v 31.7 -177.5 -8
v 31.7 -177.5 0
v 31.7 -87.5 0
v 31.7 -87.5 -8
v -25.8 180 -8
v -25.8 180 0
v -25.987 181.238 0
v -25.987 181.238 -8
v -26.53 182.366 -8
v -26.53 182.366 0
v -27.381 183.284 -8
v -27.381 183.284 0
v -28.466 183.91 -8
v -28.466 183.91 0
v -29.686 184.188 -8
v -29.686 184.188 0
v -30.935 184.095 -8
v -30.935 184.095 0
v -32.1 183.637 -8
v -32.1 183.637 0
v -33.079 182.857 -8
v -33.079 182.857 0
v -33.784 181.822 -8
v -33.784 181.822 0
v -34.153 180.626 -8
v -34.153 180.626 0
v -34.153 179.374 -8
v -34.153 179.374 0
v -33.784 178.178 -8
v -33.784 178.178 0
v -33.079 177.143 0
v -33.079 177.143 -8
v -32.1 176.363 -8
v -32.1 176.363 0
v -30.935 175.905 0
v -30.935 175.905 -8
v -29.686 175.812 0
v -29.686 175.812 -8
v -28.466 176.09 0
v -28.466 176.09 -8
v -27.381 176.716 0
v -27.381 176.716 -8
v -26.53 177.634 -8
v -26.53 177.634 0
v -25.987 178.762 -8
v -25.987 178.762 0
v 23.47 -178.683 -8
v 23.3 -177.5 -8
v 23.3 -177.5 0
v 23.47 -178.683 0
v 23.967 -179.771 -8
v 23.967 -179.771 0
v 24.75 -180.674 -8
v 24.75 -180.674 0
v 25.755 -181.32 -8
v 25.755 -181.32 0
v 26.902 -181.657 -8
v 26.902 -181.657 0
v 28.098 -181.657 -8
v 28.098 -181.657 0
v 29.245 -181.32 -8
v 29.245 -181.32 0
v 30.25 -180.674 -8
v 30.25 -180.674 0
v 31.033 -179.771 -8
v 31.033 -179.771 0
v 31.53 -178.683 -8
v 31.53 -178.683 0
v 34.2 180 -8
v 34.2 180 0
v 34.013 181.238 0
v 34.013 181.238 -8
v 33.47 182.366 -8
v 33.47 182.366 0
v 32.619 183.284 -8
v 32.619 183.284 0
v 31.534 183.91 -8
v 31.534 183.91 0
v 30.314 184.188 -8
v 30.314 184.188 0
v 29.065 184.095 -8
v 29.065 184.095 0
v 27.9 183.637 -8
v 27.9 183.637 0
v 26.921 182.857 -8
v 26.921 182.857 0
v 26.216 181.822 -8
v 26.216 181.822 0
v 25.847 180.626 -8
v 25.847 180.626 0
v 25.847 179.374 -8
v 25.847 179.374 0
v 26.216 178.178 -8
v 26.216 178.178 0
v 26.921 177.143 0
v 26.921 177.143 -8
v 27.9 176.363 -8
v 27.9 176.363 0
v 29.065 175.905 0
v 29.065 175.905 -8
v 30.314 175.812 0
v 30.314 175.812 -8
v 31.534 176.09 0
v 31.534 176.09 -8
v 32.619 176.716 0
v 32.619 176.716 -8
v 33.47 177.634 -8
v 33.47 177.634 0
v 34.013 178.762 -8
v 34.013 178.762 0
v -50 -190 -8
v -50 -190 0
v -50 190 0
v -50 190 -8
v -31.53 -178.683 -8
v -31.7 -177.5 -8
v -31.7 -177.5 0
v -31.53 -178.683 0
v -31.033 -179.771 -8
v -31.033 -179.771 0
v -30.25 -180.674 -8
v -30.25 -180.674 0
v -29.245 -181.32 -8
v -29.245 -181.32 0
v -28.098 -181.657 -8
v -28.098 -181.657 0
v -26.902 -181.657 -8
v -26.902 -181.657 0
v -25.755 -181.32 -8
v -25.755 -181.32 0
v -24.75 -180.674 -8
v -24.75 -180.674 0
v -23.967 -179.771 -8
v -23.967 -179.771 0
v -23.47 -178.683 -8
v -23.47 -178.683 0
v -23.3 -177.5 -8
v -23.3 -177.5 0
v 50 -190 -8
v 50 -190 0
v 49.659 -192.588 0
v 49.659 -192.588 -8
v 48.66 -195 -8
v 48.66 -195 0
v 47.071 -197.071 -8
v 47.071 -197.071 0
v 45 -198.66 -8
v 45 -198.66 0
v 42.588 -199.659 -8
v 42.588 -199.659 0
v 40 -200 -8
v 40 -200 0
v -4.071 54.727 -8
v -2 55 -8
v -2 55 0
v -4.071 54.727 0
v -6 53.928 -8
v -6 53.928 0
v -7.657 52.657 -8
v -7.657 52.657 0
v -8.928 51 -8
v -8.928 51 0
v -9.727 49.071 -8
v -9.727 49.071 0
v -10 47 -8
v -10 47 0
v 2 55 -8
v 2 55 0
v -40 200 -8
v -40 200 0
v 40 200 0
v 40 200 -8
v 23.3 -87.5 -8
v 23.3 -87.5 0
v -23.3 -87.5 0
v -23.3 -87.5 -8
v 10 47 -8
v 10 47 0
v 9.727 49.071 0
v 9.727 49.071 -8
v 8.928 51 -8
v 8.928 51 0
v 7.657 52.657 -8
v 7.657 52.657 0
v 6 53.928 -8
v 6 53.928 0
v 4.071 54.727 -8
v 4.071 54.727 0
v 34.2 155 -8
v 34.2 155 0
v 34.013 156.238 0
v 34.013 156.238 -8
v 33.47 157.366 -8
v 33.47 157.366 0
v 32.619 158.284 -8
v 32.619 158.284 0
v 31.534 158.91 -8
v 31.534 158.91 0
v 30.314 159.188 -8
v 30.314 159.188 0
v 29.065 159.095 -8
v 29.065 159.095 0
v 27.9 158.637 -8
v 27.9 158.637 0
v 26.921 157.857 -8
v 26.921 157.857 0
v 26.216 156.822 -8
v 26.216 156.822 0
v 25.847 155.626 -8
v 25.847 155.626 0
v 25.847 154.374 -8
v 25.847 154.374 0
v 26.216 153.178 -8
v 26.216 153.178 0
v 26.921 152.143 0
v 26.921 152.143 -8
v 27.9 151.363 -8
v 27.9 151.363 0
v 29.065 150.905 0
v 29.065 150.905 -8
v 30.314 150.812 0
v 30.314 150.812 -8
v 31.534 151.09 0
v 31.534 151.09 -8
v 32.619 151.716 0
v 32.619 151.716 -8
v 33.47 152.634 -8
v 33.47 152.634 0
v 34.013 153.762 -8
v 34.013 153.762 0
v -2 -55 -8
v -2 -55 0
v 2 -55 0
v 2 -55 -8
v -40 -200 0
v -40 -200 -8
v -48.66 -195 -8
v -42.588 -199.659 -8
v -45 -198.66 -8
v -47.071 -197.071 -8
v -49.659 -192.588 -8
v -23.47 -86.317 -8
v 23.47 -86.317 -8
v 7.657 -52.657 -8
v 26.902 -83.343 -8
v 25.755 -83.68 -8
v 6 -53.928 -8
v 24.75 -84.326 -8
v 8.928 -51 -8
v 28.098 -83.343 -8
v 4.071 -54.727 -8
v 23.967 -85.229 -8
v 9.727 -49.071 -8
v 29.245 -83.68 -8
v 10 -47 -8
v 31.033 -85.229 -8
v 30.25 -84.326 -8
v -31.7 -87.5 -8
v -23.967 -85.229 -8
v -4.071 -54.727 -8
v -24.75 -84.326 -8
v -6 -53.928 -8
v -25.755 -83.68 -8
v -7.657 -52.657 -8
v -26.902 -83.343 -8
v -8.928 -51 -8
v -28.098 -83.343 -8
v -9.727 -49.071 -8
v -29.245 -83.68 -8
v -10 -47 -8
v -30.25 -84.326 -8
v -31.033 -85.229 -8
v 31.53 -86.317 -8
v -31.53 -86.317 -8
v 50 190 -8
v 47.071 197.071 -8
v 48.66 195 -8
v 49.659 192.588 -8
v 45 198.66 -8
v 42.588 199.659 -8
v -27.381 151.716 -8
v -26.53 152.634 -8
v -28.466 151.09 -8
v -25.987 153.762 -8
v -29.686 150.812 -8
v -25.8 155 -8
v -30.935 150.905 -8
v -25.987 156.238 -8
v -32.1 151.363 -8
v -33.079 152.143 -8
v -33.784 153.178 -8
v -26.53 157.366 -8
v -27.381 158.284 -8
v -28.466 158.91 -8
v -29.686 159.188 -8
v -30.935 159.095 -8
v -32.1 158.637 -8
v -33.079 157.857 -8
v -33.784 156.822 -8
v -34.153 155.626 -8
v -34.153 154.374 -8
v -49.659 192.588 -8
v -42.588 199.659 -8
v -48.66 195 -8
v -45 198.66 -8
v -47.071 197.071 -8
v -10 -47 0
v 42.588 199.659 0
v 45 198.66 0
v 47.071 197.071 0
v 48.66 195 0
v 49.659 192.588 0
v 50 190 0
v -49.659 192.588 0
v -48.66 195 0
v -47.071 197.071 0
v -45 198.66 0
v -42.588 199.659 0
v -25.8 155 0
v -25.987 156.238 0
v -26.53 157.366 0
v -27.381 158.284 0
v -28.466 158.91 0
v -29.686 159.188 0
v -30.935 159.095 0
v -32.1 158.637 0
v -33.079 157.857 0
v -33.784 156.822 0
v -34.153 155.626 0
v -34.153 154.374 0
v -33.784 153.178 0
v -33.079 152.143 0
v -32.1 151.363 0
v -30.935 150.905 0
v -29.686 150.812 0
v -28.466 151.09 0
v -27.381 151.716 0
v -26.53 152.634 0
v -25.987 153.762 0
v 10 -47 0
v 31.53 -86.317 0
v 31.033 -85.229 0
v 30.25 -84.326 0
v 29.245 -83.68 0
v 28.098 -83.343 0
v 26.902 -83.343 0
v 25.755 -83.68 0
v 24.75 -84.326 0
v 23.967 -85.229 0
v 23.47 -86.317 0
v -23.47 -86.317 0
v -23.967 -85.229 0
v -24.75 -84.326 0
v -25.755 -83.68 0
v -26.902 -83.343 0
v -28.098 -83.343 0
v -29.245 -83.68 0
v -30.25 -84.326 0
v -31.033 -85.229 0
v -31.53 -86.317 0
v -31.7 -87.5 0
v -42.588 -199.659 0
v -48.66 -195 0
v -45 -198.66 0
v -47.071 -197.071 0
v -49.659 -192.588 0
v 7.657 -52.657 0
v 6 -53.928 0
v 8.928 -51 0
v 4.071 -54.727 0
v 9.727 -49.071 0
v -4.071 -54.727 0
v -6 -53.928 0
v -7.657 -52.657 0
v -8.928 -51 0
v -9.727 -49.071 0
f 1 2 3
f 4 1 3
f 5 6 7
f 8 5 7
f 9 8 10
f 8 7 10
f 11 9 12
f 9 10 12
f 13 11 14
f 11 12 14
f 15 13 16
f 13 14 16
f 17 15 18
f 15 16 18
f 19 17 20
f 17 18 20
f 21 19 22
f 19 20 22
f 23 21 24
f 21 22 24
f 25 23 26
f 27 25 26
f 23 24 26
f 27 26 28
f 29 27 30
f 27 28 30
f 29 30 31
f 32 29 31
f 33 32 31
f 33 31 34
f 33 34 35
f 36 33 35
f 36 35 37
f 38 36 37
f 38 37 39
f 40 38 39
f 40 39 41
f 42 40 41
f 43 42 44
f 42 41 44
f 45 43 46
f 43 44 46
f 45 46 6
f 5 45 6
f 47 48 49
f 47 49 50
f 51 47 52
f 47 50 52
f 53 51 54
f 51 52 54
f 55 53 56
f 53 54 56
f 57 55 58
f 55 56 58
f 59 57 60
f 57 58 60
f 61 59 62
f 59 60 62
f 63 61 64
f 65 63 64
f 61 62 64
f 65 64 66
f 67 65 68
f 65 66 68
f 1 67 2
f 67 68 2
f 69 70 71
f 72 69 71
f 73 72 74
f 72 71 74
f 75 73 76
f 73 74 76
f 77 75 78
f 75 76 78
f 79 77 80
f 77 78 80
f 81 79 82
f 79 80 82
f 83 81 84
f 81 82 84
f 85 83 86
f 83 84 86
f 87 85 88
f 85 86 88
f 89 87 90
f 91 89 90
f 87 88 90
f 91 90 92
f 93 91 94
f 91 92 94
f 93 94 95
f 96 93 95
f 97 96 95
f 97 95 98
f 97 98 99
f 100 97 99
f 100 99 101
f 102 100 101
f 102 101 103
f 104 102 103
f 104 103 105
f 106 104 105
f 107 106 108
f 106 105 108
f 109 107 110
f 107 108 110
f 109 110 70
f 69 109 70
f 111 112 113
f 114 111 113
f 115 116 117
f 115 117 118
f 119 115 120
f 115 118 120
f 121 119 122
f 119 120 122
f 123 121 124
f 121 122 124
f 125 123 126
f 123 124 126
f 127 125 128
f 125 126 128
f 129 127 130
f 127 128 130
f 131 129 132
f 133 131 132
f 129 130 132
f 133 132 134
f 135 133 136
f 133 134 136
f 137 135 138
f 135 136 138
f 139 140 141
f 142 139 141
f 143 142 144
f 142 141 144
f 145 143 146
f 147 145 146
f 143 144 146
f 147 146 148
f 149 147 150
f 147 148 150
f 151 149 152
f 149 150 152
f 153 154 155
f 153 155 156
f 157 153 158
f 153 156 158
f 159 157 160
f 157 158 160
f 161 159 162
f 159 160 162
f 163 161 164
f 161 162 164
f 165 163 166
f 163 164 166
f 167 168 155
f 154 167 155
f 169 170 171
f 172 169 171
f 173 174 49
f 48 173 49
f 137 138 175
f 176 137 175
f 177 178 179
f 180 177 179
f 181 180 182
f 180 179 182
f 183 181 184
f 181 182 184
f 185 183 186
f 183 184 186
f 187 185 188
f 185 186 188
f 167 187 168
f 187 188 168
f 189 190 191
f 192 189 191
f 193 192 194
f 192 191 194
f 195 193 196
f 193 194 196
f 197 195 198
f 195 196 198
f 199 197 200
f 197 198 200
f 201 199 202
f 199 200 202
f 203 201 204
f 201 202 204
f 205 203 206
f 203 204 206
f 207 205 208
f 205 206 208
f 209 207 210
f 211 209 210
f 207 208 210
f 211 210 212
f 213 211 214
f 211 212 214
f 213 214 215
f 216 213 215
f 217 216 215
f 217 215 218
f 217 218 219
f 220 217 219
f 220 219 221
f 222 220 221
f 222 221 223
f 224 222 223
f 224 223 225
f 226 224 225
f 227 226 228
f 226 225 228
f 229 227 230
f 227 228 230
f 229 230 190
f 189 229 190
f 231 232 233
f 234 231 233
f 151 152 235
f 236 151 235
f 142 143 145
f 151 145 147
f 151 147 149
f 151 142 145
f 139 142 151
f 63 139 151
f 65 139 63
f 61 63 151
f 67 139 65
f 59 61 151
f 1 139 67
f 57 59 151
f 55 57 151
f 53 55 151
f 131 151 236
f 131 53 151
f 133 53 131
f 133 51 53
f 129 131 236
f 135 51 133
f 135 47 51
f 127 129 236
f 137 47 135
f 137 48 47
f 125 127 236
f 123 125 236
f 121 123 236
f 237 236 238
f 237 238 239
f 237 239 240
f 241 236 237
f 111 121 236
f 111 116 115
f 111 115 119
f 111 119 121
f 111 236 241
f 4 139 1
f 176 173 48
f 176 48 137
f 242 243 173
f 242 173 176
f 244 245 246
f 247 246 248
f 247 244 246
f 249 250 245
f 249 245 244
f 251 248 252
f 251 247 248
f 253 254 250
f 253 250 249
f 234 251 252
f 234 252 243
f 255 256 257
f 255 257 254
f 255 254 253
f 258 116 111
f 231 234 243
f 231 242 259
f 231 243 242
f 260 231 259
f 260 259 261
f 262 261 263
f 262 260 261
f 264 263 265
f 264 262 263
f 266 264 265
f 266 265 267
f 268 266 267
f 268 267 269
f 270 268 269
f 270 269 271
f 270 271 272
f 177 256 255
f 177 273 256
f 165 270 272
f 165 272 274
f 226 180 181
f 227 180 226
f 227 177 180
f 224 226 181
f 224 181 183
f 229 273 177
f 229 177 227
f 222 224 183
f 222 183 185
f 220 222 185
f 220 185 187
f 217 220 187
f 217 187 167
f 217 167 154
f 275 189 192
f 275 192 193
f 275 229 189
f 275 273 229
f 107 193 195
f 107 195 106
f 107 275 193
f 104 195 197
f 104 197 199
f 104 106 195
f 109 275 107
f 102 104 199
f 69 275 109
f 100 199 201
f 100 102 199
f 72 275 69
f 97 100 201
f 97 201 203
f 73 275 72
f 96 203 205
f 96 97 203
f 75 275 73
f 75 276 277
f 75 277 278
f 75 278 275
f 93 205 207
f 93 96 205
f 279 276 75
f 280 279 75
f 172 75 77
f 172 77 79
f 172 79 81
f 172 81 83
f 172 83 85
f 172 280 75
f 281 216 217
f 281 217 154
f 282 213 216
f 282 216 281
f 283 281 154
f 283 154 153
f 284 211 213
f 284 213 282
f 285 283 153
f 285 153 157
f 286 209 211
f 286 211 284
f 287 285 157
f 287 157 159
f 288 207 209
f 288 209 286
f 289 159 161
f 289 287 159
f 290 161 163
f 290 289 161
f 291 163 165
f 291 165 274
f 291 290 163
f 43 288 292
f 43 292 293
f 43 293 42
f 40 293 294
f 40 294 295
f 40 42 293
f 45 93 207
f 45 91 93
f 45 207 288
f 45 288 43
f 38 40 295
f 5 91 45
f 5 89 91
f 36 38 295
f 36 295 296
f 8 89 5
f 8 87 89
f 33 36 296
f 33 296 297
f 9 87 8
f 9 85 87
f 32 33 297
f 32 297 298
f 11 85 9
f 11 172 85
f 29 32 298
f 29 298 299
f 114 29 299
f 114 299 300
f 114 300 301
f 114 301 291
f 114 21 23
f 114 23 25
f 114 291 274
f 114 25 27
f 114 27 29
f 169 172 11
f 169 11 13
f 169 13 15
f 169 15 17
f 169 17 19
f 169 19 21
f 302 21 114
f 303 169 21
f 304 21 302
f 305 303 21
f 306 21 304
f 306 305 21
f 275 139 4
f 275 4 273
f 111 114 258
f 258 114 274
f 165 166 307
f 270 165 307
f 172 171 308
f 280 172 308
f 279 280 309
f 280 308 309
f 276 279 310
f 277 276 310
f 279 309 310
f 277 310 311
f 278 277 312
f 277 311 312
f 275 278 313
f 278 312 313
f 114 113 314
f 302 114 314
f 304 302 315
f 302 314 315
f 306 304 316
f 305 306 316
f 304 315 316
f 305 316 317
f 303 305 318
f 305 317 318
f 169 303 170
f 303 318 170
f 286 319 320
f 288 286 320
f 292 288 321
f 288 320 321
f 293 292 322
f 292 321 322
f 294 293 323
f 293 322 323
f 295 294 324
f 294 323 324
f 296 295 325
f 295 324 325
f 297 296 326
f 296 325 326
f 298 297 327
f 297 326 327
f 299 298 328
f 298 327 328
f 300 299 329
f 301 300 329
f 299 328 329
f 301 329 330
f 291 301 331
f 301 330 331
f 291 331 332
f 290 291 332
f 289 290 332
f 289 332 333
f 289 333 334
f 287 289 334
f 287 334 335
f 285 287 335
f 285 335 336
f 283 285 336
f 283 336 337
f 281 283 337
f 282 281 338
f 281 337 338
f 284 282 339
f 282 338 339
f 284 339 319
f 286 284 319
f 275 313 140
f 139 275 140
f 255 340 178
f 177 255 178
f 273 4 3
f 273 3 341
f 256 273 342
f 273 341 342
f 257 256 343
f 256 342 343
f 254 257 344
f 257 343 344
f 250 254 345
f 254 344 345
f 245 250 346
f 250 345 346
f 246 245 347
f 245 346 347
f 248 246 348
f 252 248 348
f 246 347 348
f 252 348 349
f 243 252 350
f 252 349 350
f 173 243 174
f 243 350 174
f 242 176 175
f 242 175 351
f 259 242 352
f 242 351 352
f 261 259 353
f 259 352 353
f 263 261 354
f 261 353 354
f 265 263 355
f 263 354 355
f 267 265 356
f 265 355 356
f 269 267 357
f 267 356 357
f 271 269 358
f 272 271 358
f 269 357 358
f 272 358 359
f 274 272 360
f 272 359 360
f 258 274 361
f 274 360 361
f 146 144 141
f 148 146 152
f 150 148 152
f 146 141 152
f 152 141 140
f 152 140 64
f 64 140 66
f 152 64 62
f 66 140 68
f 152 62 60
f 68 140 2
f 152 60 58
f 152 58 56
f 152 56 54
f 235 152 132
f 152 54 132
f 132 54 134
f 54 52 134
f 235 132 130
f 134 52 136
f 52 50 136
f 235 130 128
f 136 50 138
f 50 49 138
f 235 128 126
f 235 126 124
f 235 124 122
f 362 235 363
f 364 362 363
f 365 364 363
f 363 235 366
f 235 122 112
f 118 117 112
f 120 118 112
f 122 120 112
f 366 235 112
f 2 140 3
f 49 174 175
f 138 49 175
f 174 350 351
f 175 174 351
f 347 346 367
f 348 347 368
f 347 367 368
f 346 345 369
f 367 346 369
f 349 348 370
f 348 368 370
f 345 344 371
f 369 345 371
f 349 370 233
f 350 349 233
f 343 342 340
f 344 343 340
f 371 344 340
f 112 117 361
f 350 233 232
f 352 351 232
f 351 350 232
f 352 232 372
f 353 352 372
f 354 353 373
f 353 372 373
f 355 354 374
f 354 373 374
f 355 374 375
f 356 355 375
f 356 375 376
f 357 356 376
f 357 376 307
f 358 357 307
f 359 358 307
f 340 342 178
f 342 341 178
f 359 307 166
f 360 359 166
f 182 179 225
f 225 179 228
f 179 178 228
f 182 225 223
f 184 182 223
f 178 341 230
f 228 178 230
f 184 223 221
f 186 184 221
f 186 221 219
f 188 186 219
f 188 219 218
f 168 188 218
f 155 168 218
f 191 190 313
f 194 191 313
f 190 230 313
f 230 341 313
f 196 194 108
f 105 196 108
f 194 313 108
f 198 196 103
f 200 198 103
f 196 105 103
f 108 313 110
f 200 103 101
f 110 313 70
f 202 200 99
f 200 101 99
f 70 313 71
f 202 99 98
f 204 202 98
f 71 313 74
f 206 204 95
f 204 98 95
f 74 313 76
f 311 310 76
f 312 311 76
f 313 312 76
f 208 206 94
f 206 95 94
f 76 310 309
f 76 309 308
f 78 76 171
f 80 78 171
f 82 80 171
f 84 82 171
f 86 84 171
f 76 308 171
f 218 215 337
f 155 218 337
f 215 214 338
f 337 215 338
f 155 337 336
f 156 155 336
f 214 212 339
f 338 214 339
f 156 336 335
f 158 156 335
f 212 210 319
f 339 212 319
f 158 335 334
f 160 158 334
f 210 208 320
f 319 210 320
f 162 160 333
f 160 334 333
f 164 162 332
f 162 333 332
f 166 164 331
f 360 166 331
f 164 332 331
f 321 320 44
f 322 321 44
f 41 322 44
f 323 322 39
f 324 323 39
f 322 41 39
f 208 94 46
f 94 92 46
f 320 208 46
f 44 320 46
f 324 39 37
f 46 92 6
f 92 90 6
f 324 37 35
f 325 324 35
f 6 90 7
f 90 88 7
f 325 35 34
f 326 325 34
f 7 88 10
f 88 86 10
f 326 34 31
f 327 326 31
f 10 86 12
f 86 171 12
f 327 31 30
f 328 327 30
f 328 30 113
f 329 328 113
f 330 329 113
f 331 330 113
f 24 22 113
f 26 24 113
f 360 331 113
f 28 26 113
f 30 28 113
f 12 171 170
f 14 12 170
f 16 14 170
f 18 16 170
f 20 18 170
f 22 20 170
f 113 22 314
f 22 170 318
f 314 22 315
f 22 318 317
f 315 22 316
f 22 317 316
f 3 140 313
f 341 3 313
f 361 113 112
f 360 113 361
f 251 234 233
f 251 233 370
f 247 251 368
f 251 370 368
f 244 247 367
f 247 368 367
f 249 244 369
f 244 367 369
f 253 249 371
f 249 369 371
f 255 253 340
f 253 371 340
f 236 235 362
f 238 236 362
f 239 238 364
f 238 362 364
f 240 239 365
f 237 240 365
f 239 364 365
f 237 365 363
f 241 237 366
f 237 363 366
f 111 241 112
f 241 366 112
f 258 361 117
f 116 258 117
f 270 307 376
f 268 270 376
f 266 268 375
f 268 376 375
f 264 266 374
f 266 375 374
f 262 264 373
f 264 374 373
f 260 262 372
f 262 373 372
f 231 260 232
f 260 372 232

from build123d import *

# Parameters (mm, degrees)
SKETCH1_R          = 4.2
BASE_FLANGE1_DEPTH = 8


# Sheet-metal steps are written as plain solids
with BuildPart() as part:
    # Sketch1 → Base-Flange1 (new body)
    with BuildSketch(Plane.XY):
        with BuildLine():
            Line((-40, 200), (40, 200))
            ThreePointArc((40, 200), (47.071067812, 197.071067812), (50, 190))
            Line((50, 190), (50, -190))
            ThreePointArc((50, -190), (47.071067812, -197.071067812), (40, -200))
            Line((40, -200), (-40, -200))
            ThreePointArc((-40, -200), (-47.071067812, -197.071067812), (-50, -190))
            Line((-50, -190), (-50, 190))
            ThreePointArc((-50, 190), (-47.071067812, 197.071067812), (-40, 200))
        make_face()
        with Locations((30, 180)):
            Circle(SKETCH1_R, mode=Mode.SUBTRACT)
        with Locations((30, 155)):
            Circle(SKETCH1_R, mode=Mode.SUBTRACT)
        with Locations((-30, 180)):
            Circle(SKETCH1_R, mode=Mode.SUBTRACT)
        with Locations((-30, 155)):
            Circle(SKETCH1_R, mode=Mode.SUBTRACT)
        with BuildLine():
            Line((23.3, -87.5), (23.3, -177.5))
            ThreePointArc((23.3, -177.5), (27.5, -181.7), (31.7, -177.5))
            Line((31.7, -177.5), (31.7, -87.5))
            ThreePointArc((31.7, -87.5), (27.5, -83.3), (23.3, -87.5))
        make_face(mode=Mode.SUBTRACT)
        with BuildLine():
            Line((-23.3, -177.5), (-23.3, -87.5))
            ThreePointArc((-23.3, -87.5), (-27.5, -83.3), (-31.7, -87.5))
            Line((-31.7, -87.5), (-31.7, -177.5))
            ThreePointArc((-31.7, -177.5), (-27.5, -181.7), (-23.3, -177.5))
        make_face(mode=Mode.SUBTRACT)
        with BuildLine():
            Line((-2, -55), (2, -55))
            ThreePointArc((2, -55), (7.656854249, -52.656854249), (10, -47))
            Line((10, -47), (10, 47))
            ThreePointArc((10, 47), (7.656854249, 52.656854249), (2, 55))
            Line((2, 55), (-2, 55))
            ThreePointArc((-2, 55), (-7.656854249, 52.656854249), (-10, 47))
            Line((-10, 47), (-10, -47))
            ThreePointArc((-10, -47), (-7.656854249, -52.656854249), (-2, -55))
        make_face(mode=Mode.SUBTRACT)
    extrude(amount=-BASE_FLANGE1_DEPTH)


solid = part.part
